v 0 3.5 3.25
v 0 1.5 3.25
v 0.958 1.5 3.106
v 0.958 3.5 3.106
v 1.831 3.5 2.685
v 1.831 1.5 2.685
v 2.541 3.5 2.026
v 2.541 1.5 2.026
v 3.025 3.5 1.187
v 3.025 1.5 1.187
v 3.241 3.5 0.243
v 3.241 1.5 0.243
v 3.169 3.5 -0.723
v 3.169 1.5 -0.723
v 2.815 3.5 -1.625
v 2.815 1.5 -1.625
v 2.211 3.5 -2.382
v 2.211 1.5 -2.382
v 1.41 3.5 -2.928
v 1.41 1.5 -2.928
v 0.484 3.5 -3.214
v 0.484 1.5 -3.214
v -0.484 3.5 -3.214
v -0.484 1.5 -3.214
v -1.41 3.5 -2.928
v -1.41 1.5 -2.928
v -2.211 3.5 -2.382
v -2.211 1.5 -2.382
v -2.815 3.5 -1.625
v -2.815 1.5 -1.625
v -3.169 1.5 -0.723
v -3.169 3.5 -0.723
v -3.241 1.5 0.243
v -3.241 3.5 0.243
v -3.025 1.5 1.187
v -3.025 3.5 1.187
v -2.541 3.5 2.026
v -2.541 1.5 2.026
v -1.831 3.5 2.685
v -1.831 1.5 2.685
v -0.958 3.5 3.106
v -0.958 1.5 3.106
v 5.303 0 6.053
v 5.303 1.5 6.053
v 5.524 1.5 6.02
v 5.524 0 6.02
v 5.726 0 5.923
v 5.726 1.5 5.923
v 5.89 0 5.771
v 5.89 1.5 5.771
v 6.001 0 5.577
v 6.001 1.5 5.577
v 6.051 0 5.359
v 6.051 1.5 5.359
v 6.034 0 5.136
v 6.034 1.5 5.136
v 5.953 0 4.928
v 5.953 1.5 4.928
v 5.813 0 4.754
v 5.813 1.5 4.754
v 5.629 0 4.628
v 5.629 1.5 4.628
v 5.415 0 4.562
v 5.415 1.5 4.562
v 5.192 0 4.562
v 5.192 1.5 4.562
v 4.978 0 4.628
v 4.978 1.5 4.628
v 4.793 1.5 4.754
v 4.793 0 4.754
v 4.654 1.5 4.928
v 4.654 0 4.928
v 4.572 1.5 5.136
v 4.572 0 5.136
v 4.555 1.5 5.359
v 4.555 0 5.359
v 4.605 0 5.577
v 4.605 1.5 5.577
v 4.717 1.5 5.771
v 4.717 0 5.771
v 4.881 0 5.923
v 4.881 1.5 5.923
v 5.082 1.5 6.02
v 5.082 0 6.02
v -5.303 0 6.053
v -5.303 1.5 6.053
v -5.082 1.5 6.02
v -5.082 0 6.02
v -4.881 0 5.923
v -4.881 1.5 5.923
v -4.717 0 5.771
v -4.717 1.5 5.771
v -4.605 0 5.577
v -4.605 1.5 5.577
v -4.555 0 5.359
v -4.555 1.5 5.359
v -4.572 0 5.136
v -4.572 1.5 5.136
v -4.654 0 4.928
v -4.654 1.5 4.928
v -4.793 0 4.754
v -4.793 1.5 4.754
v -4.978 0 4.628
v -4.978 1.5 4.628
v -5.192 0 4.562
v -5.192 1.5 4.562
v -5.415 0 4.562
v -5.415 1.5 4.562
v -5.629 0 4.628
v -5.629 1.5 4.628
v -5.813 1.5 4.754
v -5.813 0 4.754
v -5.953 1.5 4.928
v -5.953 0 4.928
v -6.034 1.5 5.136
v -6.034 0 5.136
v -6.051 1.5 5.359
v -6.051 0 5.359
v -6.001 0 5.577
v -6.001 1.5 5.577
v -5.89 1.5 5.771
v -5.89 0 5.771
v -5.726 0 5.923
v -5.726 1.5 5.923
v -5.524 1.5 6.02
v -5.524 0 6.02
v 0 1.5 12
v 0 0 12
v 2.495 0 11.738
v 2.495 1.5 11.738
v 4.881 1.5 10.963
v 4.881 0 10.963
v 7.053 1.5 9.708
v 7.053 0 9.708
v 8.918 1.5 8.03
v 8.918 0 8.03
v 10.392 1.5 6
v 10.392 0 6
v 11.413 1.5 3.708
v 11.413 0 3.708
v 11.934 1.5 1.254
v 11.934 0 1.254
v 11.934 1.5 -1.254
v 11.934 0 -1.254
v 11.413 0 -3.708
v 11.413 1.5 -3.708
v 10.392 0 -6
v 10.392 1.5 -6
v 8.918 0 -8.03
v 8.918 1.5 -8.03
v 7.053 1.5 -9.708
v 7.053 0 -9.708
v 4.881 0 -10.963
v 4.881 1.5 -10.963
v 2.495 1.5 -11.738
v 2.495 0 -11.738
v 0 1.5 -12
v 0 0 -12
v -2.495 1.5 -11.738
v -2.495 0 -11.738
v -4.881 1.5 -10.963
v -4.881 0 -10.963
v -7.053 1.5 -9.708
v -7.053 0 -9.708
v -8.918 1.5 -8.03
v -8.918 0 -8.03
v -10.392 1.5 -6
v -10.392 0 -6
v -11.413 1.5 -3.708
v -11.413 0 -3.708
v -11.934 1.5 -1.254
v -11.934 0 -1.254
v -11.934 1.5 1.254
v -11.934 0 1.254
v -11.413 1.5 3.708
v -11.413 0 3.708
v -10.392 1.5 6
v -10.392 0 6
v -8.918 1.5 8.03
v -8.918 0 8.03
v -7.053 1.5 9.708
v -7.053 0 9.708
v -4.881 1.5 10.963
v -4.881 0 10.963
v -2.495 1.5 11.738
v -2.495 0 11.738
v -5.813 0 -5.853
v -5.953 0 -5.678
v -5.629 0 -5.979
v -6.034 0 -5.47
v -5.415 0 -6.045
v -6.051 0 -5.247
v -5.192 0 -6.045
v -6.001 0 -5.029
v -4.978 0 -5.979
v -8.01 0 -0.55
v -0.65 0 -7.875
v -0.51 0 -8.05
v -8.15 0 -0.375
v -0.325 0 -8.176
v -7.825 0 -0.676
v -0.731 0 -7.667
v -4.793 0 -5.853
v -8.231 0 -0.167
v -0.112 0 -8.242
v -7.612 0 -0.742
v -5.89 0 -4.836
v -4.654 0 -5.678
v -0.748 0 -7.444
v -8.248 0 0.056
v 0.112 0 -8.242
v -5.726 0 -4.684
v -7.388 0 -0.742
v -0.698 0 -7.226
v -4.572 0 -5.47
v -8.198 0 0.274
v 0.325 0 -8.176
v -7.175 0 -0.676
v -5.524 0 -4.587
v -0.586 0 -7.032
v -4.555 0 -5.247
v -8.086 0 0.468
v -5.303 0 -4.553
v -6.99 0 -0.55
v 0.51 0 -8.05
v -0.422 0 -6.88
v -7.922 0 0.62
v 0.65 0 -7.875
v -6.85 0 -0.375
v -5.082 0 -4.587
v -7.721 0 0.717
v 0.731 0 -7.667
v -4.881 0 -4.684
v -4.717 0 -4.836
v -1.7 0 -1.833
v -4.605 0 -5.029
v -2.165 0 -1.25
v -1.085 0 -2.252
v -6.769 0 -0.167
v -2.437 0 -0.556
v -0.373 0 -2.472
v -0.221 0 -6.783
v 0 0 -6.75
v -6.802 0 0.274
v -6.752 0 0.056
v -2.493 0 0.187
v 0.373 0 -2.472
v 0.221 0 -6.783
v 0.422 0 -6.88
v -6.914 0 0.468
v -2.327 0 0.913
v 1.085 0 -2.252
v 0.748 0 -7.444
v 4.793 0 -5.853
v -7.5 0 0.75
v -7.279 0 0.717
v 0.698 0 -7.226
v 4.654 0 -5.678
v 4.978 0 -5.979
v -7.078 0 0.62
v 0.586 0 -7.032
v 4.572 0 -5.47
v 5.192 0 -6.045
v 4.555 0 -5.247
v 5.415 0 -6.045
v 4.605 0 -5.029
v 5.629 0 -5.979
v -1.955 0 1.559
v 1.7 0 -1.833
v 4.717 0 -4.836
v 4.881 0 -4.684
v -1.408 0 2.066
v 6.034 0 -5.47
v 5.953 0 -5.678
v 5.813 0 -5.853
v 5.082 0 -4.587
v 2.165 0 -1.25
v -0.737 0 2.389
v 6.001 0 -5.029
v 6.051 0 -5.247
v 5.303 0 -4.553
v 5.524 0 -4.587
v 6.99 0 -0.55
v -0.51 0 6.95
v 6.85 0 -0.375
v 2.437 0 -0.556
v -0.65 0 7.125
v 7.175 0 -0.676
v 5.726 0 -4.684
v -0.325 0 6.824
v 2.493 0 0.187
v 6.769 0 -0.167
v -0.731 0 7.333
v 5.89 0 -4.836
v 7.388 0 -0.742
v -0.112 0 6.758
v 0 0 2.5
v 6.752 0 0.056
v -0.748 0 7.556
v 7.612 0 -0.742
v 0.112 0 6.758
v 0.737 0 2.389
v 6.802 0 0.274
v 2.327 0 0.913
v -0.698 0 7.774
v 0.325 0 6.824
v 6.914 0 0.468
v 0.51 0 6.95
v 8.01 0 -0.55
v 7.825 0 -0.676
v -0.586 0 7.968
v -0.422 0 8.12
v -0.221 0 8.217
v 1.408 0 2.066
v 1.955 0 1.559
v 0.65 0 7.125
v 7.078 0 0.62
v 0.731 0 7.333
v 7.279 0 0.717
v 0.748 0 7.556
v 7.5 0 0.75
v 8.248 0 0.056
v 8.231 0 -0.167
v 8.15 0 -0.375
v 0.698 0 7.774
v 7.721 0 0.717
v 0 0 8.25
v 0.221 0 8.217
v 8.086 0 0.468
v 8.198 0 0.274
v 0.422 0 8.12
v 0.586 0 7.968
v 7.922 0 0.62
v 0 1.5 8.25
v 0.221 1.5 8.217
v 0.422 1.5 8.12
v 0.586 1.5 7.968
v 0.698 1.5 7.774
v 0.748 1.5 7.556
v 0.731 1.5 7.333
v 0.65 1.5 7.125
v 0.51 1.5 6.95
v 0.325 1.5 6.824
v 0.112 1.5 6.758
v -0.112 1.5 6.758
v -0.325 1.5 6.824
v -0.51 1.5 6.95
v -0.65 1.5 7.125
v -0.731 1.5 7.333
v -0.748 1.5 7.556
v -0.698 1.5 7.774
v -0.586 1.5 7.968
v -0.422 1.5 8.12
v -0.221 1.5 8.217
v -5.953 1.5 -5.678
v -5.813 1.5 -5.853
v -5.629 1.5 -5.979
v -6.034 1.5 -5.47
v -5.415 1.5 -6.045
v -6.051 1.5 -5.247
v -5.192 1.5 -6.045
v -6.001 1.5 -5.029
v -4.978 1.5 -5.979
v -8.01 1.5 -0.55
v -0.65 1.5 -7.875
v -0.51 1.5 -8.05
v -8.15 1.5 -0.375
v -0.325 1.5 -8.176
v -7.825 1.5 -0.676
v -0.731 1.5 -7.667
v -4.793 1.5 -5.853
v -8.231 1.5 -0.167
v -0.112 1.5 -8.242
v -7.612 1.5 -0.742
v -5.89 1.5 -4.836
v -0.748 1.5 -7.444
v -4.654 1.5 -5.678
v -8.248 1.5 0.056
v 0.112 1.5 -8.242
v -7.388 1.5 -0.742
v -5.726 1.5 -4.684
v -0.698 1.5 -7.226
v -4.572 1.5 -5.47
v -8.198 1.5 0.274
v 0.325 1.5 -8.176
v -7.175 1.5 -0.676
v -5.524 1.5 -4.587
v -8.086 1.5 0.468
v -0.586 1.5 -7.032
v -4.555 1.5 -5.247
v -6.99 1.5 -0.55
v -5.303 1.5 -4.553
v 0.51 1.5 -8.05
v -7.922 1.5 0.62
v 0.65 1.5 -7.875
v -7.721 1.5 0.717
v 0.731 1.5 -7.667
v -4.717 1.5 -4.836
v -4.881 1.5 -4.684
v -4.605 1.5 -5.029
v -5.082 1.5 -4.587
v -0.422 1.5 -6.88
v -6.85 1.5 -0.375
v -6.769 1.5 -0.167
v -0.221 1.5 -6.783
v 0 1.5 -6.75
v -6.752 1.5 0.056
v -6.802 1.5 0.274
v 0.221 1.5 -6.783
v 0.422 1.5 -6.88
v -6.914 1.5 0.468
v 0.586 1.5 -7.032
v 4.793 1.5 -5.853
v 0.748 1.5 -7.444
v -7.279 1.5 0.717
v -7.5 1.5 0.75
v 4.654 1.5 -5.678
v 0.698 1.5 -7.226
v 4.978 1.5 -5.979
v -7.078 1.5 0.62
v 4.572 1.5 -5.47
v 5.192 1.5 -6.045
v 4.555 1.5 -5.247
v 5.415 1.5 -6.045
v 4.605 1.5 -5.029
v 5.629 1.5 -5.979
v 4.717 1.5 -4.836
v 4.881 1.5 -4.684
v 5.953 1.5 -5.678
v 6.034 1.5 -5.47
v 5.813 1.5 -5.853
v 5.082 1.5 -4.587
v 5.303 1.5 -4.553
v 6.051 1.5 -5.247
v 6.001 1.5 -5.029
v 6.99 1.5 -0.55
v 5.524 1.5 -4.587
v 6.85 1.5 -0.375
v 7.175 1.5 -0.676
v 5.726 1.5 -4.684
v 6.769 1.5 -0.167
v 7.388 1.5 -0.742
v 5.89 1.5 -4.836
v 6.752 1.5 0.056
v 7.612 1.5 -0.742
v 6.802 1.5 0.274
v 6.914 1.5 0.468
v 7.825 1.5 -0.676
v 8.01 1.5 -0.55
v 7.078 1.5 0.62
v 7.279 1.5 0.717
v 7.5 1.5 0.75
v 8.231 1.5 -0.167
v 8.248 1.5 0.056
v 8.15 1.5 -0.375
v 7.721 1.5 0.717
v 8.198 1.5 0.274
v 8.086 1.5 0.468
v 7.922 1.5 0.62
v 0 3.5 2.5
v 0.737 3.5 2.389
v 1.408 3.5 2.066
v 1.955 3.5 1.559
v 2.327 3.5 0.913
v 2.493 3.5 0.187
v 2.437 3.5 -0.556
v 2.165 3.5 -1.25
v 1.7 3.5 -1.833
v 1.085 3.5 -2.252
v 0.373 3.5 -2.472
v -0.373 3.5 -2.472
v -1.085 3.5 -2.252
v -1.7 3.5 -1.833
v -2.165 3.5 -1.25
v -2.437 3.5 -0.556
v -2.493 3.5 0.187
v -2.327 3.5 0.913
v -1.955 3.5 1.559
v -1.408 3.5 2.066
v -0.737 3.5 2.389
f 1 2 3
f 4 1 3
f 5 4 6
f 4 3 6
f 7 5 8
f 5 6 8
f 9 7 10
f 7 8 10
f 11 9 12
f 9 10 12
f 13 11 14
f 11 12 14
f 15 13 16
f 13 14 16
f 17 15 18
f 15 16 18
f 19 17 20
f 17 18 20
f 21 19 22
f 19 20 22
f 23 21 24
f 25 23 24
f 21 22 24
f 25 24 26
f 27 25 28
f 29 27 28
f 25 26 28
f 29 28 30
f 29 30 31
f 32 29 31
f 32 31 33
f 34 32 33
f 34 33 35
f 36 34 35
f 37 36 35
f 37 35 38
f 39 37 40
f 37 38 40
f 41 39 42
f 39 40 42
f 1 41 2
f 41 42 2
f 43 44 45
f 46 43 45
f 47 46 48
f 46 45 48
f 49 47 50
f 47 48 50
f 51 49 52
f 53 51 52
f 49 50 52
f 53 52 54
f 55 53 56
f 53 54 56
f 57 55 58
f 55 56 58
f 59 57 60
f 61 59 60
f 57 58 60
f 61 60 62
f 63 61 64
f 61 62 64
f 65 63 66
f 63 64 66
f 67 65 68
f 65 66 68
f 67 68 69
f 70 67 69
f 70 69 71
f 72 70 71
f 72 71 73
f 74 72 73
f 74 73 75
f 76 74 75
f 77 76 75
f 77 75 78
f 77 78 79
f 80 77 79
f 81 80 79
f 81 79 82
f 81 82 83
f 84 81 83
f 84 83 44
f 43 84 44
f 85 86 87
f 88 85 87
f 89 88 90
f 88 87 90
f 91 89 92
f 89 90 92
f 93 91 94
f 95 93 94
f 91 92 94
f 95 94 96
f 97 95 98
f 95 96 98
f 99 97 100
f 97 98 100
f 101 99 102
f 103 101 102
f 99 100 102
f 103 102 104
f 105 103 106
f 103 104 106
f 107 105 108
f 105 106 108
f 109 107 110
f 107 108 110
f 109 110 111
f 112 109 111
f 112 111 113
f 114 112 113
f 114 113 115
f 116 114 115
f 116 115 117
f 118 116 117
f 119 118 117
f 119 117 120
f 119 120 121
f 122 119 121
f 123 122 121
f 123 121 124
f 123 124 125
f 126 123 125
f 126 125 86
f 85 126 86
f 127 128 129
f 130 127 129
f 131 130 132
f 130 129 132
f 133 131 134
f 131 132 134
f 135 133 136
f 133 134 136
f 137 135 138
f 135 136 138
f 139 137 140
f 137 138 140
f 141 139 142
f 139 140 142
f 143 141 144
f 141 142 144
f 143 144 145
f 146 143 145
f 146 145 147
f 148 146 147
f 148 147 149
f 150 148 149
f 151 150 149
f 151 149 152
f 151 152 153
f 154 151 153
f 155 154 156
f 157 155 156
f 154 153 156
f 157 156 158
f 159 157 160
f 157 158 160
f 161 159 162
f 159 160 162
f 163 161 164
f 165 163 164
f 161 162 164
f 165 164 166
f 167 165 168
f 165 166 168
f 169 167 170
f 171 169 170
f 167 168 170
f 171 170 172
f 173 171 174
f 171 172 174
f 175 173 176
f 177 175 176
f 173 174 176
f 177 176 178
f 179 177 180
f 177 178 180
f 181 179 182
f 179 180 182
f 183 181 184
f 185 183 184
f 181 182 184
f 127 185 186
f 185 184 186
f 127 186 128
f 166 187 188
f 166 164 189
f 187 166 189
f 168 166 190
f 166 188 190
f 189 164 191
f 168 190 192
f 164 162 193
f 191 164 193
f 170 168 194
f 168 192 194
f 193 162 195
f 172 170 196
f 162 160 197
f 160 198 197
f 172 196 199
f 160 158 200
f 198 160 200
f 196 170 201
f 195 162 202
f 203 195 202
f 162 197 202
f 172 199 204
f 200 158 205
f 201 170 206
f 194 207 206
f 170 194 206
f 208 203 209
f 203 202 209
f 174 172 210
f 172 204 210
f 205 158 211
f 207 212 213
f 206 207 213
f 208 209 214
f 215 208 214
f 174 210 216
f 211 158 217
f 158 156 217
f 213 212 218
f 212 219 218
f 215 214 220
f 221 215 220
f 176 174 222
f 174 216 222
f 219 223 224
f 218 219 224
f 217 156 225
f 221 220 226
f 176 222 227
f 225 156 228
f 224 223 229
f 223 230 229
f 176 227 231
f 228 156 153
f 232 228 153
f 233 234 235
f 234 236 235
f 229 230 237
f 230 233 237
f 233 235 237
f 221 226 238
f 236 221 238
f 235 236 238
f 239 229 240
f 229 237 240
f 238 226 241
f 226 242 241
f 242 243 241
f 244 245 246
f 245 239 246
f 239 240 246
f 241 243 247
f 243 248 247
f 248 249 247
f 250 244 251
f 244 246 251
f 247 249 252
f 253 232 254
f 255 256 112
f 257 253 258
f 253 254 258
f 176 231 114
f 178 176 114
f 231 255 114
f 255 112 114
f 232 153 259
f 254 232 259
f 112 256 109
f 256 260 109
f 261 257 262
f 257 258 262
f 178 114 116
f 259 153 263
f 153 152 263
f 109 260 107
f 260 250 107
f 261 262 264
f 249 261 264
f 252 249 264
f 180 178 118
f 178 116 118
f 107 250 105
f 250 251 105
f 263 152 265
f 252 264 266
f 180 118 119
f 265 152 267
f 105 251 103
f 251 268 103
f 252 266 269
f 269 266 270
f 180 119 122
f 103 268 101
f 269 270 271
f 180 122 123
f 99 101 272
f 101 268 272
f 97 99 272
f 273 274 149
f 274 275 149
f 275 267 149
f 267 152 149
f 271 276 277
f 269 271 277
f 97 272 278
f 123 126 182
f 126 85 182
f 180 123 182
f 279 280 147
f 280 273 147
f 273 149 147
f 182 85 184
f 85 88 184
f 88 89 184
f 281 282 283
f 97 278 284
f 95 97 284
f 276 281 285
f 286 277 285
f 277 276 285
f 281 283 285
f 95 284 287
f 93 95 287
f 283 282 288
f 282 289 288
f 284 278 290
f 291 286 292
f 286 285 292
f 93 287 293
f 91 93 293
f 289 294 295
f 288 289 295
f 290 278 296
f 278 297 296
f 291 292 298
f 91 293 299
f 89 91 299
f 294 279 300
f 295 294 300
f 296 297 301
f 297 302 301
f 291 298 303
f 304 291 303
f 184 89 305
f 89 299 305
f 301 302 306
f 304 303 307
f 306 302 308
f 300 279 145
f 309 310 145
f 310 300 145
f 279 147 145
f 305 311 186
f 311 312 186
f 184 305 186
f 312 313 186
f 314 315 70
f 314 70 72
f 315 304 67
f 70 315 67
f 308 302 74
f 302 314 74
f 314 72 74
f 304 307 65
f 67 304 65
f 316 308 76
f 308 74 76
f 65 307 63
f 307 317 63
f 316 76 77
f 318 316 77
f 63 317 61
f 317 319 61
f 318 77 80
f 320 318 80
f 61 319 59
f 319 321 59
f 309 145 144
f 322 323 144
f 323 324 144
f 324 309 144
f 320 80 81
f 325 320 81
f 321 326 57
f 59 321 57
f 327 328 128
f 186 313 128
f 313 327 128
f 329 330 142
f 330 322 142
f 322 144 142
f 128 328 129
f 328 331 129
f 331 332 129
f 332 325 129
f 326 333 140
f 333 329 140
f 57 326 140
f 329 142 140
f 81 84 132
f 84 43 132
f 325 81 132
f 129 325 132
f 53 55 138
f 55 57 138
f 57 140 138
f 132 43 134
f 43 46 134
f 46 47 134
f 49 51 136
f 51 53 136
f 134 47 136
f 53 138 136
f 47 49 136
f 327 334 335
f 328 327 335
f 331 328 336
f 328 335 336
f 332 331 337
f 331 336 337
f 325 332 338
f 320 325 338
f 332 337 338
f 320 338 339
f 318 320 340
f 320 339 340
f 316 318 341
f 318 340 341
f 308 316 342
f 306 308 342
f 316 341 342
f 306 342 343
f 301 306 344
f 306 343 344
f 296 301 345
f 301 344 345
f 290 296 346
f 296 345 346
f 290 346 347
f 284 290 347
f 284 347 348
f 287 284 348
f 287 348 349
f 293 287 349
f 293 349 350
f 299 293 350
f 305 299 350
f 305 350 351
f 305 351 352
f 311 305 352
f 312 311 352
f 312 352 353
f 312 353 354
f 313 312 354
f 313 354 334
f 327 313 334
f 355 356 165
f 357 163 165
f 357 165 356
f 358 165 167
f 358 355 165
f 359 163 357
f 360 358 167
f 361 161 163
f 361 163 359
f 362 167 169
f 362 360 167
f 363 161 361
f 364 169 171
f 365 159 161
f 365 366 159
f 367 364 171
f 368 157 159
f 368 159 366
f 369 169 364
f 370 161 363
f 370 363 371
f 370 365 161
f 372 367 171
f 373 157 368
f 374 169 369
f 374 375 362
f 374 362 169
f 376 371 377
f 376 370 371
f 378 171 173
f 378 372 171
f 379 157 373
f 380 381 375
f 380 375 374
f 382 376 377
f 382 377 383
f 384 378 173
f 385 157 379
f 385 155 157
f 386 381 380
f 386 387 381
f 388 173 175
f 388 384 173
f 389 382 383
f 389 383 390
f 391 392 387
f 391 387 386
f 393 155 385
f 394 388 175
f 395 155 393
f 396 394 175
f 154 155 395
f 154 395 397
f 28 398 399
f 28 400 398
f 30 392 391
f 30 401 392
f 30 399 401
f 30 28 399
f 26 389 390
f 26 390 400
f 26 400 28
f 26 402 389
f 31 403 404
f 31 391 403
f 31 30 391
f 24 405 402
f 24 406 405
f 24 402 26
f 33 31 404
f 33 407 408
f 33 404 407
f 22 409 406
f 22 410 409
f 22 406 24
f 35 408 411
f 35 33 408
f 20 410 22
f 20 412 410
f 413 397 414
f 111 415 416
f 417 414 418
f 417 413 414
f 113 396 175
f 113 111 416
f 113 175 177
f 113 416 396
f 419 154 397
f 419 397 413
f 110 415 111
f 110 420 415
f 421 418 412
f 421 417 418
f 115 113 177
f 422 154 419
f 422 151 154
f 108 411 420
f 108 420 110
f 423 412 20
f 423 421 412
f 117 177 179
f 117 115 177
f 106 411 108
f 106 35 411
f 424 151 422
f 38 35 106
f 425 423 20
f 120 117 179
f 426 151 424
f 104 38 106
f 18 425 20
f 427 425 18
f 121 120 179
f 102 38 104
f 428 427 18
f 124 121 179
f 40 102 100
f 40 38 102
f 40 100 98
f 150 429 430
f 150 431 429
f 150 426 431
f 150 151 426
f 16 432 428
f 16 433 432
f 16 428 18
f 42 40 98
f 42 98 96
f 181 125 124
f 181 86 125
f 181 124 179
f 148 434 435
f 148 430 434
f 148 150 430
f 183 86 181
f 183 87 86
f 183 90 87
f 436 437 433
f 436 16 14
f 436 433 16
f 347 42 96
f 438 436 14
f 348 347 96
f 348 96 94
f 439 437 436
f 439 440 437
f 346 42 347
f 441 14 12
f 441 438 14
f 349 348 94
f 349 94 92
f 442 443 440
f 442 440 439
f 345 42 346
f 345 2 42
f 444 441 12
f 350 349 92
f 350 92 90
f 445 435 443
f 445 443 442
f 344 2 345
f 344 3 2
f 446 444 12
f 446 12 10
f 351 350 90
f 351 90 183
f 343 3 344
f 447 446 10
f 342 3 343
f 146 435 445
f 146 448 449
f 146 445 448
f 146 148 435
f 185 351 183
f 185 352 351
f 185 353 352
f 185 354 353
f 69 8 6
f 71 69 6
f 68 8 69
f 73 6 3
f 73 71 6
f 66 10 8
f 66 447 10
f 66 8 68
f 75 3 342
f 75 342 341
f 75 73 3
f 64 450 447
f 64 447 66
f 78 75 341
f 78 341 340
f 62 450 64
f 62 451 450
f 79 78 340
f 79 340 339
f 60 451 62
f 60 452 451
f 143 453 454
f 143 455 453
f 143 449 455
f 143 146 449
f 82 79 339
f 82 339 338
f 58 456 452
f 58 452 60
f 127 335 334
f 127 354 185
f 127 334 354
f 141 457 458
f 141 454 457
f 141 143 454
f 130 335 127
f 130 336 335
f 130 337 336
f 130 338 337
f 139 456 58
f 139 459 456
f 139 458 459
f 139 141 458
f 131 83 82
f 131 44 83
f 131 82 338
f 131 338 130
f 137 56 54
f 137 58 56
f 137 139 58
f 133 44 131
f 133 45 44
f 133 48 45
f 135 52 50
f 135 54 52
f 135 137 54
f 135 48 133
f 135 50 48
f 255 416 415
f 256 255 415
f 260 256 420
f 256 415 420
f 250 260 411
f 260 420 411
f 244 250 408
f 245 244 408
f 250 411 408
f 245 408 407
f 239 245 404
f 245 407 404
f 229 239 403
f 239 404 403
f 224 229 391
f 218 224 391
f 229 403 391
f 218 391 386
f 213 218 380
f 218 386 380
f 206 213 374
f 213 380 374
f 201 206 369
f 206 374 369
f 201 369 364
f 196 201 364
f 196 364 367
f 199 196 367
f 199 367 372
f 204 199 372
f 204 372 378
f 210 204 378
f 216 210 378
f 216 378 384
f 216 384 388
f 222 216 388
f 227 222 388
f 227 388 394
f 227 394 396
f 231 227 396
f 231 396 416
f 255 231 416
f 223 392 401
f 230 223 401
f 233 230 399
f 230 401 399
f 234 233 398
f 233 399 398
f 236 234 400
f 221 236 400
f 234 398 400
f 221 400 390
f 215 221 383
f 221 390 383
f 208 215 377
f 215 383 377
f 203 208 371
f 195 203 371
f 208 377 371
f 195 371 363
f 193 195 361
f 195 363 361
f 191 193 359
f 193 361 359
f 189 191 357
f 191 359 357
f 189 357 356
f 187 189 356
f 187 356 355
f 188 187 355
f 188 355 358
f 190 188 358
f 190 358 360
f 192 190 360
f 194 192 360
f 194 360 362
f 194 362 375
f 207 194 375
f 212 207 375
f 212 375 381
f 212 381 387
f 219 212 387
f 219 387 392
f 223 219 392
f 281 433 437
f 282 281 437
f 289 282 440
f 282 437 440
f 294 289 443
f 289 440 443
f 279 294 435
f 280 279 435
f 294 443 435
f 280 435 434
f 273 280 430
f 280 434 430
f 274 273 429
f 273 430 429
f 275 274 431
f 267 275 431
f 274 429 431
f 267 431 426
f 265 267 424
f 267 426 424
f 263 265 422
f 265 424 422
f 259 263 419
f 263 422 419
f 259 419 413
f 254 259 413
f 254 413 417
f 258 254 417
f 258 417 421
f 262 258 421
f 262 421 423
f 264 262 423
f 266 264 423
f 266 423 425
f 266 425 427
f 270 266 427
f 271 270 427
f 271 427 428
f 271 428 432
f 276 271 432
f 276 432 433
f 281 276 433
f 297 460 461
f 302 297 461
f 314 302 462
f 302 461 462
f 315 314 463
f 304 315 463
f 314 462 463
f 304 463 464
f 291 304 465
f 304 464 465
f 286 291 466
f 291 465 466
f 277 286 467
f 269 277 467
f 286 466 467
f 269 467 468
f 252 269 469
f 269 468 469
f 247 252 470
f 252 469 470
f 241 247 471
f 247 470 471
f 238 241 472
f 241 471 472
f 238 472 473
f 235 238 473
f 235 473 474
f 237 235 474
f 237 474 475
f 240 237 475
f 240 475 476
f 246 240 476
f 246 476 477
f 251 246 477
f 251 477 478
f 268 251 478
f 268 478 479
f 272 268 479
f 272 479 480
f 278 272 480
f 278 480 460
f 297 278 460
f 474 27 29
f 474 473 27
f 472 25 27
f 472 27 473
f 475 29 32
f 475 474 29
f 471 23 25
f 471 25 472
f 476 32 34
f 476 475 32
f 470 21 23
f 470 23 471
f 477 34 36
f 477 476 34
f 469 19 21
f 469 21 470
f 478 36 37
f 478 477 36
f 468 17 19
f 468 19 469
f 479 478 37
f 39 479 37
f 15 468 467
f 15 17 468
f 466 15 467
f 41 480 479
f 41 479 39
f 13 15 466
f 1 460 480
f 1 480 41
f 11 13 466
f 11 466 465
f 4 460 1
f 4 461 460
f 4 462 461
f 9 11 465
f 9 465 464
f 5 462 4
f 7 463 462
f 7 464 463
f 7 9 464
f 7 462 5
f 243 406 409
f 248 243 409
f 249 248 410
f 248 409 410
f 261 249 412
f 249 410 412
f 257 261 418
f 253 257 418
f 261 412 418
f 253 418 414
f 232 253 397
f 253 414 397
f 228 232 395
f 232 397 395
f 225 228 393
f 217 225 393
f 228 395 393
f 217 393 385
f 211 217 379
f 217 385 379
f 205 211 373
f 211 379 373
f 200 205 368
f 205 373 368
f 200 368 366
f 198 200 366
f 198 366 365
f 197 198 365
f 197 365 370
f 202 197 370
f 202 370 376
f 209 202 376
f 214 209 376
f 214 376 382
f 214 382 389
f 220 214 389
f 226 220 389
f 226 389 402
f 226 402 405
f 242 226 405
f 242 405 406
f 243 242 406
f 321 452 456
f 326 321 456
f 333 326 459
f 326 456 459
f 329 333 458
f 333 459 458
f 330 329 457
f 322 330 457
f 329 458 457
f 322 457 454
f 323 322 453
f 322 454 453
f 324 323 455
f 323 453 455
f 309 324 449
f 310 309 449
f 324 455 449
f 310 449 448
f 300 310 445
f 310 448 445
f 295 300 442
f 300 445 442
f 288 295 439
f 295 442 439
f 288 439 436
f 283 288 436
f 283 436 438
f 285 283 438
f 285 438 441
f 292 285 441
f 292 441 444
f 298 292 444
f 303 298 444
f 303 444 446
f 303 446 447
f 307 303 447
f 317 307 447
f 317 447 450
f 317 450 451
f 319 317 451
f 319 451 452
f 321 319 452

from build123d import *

# Parameters (mm, degrees)
SKETCH1_R           = 12
BOSS_EXTRUDE1_DEPTH = 1.5
SKETCH2_R           = 3.25
BOSS_EXTRUDE2_DEPTH = 2
SKETCH3_R           = 2.5
CUT_EXTRUDE1_DEPTH  = 18.327723451
SKETCH5_R           = 0.75
CUT_EXTRUDE3_DEPTH  = 2


with BuildPart() as part:
    # Sketch1 → Boss-Extrude1 (new body)
    with BuildSketch(Plane(origin=(0, 0, 0), x_dir=(1, 0, 0), z_dir=(0, 1, 0))):
        with Locations(Location((0, 0, 0), (0, 0, 270))):
            Circle(SKETCH1_R)
    extrude(amount=BOSS_EXTRUDE1_DEPTH)

    # Sketch2 → Boss-Extrude2 (add)
    with BuildSketch(Plane(origin=(0, 1.5, 0), x_dir=(1, 0, 0), z_dir=(0, 1, 0))):
        with Locations(Location((0, 0, 0), (0, 0, 270))):
            Circle(SKETCH2_R)
    extrude(amount=BOSS_EXTRUDE2_DEPTH)

    # Sketch3 → Cut-Extrude1 (cut, through all)
    with BuildSketch(Plane(origin=(0, 3.5, 0), x_dir=(1, 0, 0), z_dir=(0, 1, 0))):
        with Locations(Location((0, 0, 0), (0, 0, 270))):
            Circle(SKETCH3_R)
    extrude(amount=-CUT_EXTRUDE1_DEPTH, mode=Mode.SUBTRACT)

    # Sketch5 → Cut-Extrude3 (cut)
    with BuildSketch(Plane(origin=(0, 1.5, 0), x_dir=(1, 0, 0), z_dir=(0, 1, 0))):
        with Locations(Location((0, 7.5, 0), (0, 0, 270))):
            Circle(SKETCH5_R)
        with Locations(Location((5.303300859, 5.303300859, 0), (0, 0, 270))):
            Circle(SKETCH5_R)
        with Locations(Location((7.5, 0, 0), (0, 0, 270))):
            Circle(SKETCH5_R)
        with Locations(Location((5.303300859, -5.303300859, 0), (0, 0, 270))):
            Circle(SKETCH5_R)
        with Locations(Location((0, -7.5, 0), (0, 0, 270))):
            Circle(SKETCH5_R)
        with Locations(Location((-5.303300859, -5.303300859, 0), (0, 0, 270))):
            Circle(SKETCH5_R)
        with Locations(Location((-7.5, 0, 0), (0, 0, 270))):
            Circle(SKETCH5_R)
        with Locations(Location((-5.303300859, 5.303300859, 0), (0, 0, 270))):
            Circle(SKETCH5_R)
    extrude(amount=-CUT_EXTRUDE3_DEPTH, mode=Mode.SUBTRACT)


solid = part.part
